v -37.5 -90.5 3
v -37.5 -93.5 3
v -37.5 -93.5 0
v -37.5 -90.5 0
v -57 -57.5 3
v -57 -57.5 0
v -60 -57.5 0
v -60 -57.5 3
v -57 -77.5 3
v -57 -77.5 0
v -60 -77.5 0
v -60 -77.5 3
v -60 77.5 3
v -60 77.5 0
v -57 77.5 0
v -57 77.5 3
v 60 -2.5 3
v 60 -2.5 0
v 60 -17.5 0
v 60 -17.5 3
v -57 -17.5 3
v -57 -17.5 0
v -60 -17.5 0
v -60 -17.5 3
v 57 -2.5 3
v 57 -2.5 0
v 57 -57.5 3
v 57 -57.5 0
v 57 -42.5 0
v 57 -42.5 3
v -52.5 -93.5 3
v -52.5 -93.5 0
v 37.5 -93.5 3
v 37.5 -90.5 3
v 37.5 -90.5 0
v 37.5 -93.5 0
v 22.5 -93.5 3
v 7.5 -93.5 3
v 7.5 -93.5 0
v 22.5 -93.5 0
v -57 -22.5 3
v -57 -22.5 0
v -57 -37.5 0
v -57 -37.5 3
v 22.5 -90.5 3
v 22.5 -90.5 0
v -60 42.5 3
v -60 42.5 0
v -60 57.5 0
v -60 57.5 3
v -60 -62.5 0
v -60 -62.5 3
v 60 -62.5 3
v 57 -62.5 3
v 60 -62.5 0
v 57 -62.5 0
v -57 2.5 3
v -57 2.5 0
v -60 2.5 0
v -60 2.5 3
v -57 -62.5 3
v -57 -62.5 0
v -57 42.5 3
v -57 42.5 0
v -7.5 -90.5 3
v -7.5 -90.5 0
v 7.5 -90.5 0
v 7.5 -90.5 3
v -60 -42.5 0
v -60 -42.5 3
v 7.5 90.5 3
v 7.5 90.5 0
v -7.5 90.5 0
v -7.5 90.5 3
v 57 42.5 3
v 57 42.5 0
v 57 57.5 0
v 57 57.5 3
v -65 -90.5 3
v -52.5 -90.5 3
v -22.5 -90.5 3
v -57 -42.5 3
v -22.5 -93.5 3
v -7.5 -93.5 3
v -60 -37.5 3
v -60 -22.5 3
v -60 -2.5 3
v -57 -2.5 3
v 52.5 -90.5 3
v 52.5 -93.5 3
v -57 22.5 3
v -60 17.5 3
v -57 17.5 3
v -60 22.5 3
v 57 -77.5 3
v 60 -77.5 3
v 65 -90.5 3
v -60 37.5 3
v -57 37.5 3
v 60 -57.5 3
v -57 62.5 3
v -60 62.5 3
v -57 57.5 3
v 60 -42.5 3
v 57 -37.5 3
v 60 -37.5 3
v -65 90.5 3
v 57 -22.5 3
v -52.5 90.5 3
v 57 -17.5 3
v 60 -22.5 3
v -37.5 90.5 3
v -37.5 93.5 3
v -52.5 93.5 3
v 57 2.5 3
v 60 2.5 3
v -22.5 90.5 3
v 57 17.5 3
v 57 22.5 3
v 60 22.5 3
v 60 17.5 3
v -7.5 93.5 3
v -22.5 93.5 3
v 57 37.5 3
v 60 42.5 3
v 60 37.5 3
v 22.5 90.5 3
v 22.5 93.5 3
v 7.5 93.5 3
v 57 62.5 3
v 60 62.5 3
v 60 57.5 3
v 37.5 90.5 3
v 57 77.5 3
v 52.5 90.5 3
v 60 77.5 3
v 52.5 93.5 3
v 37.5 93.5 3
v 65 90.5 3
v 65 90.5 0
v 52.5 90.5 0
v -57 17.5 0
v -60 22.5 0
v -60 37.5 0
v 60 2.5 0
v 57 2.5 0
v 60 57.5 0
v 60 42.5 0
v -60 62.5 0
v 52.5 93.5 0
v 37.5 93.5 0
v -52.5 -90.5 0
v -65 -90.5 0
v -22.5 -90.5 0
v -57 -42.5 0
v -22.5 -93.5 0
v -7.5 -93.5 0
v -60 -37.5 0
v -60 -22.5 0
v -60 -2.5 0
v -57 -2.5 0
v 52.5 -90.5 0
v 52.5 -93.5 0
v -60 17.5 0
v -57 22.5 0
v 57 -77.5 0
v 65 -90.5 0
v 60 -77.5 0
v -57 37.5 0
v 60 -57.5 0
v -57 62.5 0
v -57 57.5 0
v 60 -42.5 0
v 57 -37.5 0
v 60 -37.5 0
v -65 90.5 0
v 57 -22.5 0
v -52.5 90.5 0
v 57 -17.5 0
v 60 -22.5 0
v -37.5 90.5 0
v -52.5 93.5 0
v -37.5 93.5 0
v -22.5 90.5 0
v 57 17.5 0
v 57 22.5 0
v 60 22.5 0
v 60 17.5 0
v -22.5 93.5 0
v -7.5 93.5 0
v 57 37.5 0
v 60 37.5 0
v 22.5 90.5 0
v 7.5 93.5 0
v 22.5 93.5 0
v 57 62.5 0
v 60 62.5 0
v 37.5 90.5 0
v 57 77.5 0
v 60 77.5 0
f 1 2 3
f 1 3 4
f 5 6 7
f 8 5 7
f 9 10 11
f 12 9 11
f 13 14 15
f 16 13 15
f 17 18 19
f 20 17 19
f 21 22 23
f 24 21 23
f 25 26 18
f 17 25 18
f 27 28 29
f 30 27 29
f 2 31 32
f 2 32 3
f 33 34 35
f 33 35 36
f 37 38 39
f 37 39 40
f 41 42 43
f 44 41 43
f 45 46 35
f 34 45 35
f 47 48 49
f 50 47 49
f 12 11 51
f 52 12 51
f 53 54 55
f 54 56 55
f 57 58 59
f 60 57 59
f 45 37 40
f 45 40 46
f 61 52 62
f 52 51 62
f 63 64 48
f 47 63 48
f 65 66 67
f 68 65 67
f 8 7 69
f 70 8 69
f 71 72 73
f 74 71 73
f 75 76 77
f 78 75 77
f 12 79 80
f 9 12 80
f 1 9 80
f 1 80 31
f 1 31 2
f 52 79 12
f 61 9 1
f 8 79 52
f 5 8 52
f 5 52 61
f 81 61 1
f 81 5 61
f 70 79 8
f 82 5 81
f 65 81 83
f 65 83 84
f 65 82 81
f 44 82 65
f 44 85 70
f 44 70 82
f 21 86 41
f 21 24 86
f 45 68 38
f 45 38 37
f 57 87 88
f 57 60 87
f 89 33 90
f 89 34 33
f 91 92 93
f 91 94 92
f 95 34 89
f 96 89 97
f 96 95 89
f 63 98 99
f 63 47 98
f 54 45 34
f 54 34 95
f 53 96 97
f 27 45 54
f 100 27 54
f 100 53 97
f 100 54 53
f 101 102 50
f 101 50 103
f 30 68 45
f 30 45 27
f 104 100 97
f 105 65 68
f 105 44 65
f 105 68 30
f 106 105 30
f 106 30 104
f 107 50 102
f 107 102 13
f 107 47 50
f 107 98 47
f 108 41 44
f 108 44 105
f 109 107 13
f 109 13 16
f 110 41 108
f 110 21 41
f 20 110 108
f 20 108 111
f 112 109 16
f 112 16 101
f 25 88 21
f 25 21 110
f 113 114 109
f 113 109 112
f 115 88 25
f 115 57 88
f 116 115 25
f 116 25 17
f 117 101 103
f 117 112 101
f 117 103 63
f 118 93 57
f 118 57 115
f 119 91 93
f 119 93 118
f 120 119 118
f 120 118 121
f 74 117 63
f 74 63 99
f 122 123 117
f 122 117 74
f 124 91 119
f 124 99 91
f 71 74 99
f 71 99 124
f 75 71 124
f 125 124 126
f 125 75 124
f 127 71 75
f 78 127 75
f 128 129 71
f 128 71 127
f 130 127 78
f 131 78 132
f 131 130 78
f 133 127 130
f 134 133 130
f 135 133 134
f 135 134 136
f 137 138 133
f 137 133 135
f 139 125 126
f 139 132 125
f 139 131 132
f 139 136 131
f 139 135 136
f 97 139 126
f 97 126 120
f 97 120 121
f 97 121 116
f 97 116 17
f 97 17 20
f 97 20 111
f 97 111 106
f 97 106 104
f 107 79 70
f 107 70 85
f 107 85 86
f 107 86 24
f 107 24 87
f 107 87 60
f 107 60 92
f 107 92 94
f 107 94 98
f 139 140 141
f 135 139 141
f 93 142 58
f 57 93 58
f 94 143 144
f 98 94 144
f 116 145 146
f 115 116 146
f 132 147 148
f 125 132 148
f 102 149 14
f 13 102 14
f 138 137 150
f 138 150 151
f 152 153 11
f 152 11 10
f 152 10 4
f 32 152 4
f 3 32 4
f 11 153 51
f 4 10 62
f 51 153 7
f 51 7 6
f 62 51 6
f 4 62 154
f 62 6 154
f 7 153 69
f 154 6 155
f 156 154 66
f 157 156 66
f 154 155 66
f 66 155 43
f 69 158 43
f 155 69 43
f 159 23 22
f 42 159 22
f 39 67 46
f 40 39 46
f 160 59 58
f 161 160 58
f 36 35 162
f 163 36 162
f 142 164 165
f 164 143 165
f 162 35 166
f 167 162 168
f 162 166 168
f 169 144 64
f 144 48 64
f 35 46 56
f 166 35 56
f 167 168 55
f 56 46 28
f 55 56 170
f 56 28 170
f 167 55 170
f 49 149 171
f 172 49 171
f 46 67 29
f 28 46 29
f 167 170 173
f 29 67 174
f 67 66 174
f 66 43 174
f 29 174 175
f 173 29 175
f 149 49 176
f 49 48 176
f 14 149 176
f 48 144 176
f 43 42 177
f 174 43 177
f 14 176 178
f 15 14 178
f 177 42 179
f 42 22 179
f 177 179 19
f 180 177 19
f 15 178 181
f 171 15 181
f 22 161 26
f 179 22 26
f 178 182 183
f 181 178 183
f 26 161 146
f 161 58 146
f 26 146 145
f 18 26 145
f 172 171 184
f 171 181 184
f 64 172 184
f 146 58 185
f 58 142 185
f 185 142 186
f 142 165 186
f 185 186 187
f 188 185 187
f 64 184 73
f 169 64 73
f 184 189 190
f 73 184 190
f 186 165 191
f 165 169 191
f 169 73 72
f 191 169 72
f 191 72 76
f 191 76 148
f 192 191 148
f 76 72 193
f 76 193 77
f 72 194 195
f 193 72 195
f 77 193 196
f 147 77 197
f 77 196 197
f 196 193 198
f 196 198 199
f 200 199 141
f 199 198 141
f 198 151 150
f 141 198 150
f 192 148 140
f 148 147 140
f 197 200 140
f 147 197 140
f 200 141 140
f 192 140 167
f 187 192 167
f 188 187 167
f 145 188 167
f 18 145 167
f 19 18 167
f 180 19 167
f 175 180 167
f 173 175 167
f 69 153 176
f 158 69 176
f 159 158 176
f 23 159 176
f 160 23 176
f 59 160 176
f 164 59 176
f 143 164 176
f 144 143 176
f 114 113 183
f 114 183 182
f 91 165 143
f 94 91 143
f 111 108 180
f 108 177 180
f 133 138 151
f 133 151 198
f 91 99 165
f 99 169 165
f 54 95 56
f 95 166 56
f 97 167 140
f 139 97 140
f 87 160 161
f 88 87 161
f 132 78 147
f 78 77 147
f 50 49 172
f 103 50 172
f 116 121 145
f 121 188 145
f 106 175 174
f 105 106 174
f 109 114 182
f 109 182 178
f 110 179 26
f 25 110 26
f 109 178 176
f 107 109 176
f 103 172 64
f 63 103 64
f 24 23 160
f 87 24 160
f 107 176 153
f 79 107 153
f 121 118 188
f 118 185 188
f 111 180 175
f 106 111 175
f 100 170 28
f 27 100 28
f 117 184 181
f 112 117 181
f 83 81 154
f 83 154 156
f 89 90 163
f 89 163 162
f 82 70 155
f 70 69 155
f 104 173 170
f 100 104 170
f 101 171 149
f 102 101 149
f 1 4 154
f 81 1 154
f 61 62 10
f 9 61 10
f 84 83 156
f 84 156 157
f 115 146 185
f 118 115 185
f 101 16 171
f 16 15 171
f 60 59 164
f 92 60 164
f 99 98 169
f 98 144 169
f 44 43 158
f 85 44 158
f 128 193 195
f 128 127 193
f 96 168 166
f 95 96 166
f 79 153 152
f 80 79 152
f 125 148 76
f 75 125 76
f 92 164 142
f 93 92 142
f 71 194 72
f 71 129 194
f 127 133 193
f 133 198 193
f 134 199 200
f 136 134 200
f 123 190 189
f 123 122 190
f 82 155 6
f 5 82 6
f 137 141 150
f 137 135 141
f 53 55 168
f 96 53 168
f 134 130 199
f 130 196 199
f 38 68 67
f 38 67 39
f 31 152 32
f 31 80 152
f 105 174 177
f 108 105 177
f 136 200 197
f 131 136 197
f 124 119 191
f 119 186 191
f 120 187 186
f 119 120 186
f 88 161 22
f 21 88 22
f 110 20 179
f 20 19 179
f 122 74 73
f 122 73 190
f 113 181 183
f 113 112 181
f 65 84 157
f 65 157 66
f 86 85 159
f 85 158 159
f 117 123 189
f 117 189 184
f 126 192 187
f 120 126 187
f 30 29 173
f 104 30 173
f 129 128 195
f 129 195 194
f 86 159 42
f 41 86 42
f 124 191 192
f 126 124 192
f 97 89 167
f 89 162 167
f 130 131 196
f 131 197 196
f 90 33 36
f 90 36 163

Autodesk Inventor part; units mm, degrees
ref_plane "YZ Plane" through (0, 0, 0) normal (1, 0, 0) x (0, 1, 0)
ref_plane "XZ Plane" through (0, 0, 0) normal (0, 1, 0) x (-1, 0, 0)
ref_plane "XY Plane" through (0, 0, 0) normal (0, 0, 1) x (1, 0, 0)
sketch "Sketch1" plane through (0, 0, 0) normal (0, 0, 1) x (1, 0, 0)
  line L0 (-65, -90.5) -> (65, -90.5)
  line L1 (65, -90.5) -> (65, 90.5)
  line L2 (65, 90.5) -> (-65, 90.5)
  line L3 (-65, 90.5) -> (-65, -90.5)
  line L4 (-65, -90.5) -> (65, 90.5) construction
  line L5 (65, -90.5) -> (-65, 90.5) construction
  line L6 (-60, 77.5) -> (-57, 77.5)
  line L7 (-57, 77.5) -> (-57, 62.5)
  line L8 (-57, 62.5) -> (-60, 62.5)
  line L9 (-60, 62.5) -> (-60, 77.5)
  line L10 (-60, 77.5) -> (-57, 62.5) construction
  line L11 (-57, 77.5) -> (-60, 62.5) construction
  line L12 (-60, 57.5) -> (-57, 57.5)
  line L13 (-57, 57.5) -> (-57, 42.5)
  line L14 (-57, 42.5) -> (-60, 42.5)
  line L15 (-60, 42.5) -> (-60, 57.5)
  line L16 (-60, 57.5) -> (-57, 42.5) construction
  line L17 (-57, 57.5) -> (-60, 42.5) construction
  line L18 (-60, 37.5) -> (-57, 37.5)
  line L19 (-57, 37.5) -> (-57, 22.5)
  line L20 (-57, 22.5) -> (-60, 22.5)
  line L21 (-60, 22.5) -> (-60, 37.5)
  line L22 (-60, 37.5) -> (-57, 22.5) construction
  line L23 (-57, 37.5) -> (-60, 22.5) construction
  line L24 (-60, 17.5) -> (-57, 17.5)
  line L25 (-57, 17.5) -> (-57, 2.5)
  line L26 (-57, 2.5) -> (-60, 2.5)
  line L27 (-60, 2.5) -> (-60, 17.5)
  line L28 (-60, 17.5) -> (-57, 2.5) construction
  line L29 (-57, 17.5) -> (-60, 2.5) construction
  line L30 (-60, -2.5) -> (-57, -2.5)
  line L31 (-57, -2.5) -> (-57, -17.5)
  line L32 (-57, -17.5) -> (-60, -17.5)
  line L33 (-60, -17.5) -> (-60, -2.5)
  line L34 (-60, -2.5) -> (-57, -17.5) construction
  line L35 (-57, -2.5) -> (-60, -17.5) construction
  line L36 (-60, -22.5) -> (-57, -22.5)
  line L37 (-57, -22.5) -> (-57, -37.5)
  line L38 (-57, -37.5) -> (-60, -37.5)
  line L39 (-60, -37.5) -> (-60, -22.5)
  line L40 (-60, -22.5) -> (-57, -37.5) construction
  line L41 (-57, -22.5) -> (-60, -37.5) construction
  line L42 (-60, -42.5) -> (-57, -42.5)
  line L43 (-57, -42.5) -> (-57, -57.5)
  line L44 (-57, -57.5) -> (-60, -57.5)
  line L45 (-60, -57.5) -> (-60, -42.5)
  line L46 (-60, -42.5) -> (-57, -57.5) construction
  line L47 (-57, -42.5) -> (-60, -57.5) construction
  line L48 (-60, -62.5) -> (-57, -62.5)
  line L49 (-57, -62.5) -> (-57, -77.5)
  line L50 (-57, -77.5) -> (-60, -77.5)
  line L51 (-60, -77.5) -> (-60, -62.5)
  line L52 (-60, -62.5) -> (-57, -77.5) construction
  line L53 (-57, -62.5) -> (-60, -77.5) construction
  line L54 (57, 77.5) -> (60, 77.5)
  line L55 (60, 77.5) -> (60, 62.5)
  line L56 (60, 62.5) -> (57, 62.5)
  line L57 (57, 62.5) -> (57, 77.5)
  line L58 (57, 77.5) -> (60, 62.5) construction
  line L59 (60, 77.5) -> (57, 62.5) construction
  line L60 (57, 57.5) -> (60, 57.5)
  line L61 (60, 57.5) -> (60, 42.5)
  line L62 (60, 42.5) -> (57, 42.5)
  line L63 (57, 42.5) -> (57, 57.5)
  line L64 (57, 57.5) -> (60, 42.5) construction
  line L65 (60, 57.5) -> (57, 42.5) construction
  line L66 (57, 37.5) -> (60, 37.5)
  line L67 (60, 37.5) -> (60, 22.5)
  line L68 (60, 22.5) -> (57, 22.5)
  line L69 (57, 22.5) -> (57, 37.5)
  line L70 (57, 37.5) -> (60, 22.5) construction
  line L71 (60, 37.5) -> (57, 22.5) construction
  line L72 (57, 17.5) -> (60, 17.5)
  line L73 (60, 17.5) -> (60, 2.5)
  line L74 (60, 2.5) -> (57, 2.5)
  line L75 (57, 2.5) -> (57, 17.5)
  line L76 (57, 17.5) -> (60, 2.5) construction
  line L77 (60, 17.5) -> (57, 2.5) construction
  line L78 (57, -2.5) -> (60, -2.5)
  line L79 (60, -2.5) -> (60, -17.5)
  line L80 (60, -17.5) -> (57, -17.5)
  line L81 (57, -17.5) -> (57, -2.5)
  line L82 (57, -2.5) -> (60, -17.5) construction
  line L83 (60, -2.5) -> (57, -17.5) construction
  line L84 (57, -22.5) -> (60, -22.5)
  line L85 (60, -22.5) -> (60, -37.5)
  line L86 (60, -37.5) -> (57, -37.5)
  line L87 (57, -37.5) -> (57, -22.5)
  line L88 (57, -22.5) -> (60, -37.5) construction
  line L89 (60, -22.5) -> (57, -37.5) construction
  line L90 (57, -42.5) -> (60, -42.5)
  line L91 (60, -42.5) -> (60, -57.5)
  line L92 (60, -57.5) -> (57, -57.5)
  line L93 (57, -57.5) -> (57, -42.5)
  line L94 (57, -42.5) -> (60, -57.5) construction
  line L95 (60, -42.5) -> (57, -57.5) construction
  line L96 (57, -62.5) -> (60, -62.5)
  line L97 (60, -62.5) -> (60, -77.5)
  line L98 (60, -77.5) -> (57, -77.5)
  line L99 (57, -77.5) -> (57, -62.5)
  line L100 (57, -62.5) -> (60, -77.5) construction
  line L101 (60, -62.5) -> (57, -77.5) construction
  point P0 (0, 0)
  point P1 (-58.5, 70)
  point P2 (-58.5, 50)
  point P3 (-58.5, 30)
  point P4 (-58.5, 10)
  point P5 (-58.5, -10)
  point P6 (-58.5, -30)
  point P7 (-58.5, -50)
  point P8 (-58.5, -70)
  point P9 (58.5, 70)
  point P10 (58.5, 50)
  point P11 (58.5, 30)
  point P12 (58.5, 10)
  point P13 (58.5, -10)
  point P14 (58.5, -30)
  point P15 (58.5, -50)
  point P16 (58.5, -70)
  dimension "d0" = 130
  dimension "d1" = 181
  dimension "d2" = 3
  dimension "d3" = 15
  dimension "d8" = 5
  dimension "d9" = 13
  dimension "d12" = 20
  dimension "d15" = 117
extrude "Extrusion1" add sketch "Sketch1" along normal blind 3
sketch "Sketch2" plane through (0, 0, 3) normal (0, 0, 1) x (1, 0, 0)
  line L0 (65, 90.5) -> (-65, 90.5) projected
  line L1 (-52.5, 90.5) -> (-37.5, 90.5)
  line L2 (-37.5, 90.5) -> (-37.5, 93.5)
  line L3 (-37.5, 93.5) -> (-52.5, 93.5)
  line L4 (-52.5, 93.5) -> (-52.5, 90.5)
  line L5 (-22.5, 90.5) -> (-7.5, 90.5)
  line L6 (-7.5, 90.5) -> (-7.5, 93.5)
  line L7 (-7.5, 93.5) -> (-22.5, 93.5)
  line L8 (-22.5, 93.5) -> (-22.5, 90.5)
  line L9 (7.5, 90.5) -> (22.5, 90.5)
  line L10 (22.5, 90.5) -> (22.5, 93.5)
  line L11 (22.5, 93.5) -> (7.5, 93.5)
  line L12 (7.5, 93.5) -> (7.5, 90.5)
  line L13 (37.5, 90.5) -> (52.5, 90.5)
  line L14 (52.5, 90.5) -> (52.5, 93.5)
  line L15 (52.5, 93.5) -> (37.5, 93.5)
  line L16 (37.5, 93.5) -> (37.5, 90.5)
  line L17 (-52.5, -93.5) -> (-37.5, -93.5)
  line L18 (-37.5, -93.5) -> (-37.5, -90.5)
  line L19 (-37.5, -90.5) -> (-52.5, -90.5)
  line L20 (-52.5, -90.5) -> (-52.5, -93.5)
  line L21 (-22.5, -93.5) -> (-7.5, -93.5)
  line L22 (-7.5, -93.5) -> (-7.5, -90.5)
  line L23 (-7.5, -90.5) -> (-22.5, -90.5)
  line L24 (-22.5, -90.5) -> (-22.5, -93.5)
  line L25 (7.5, -93.5) -> (22.5, -93.5)
  line L26 (22.5, -93.5) -> (22.5, -90.5)
  line L27 (22.5, -90.5) -> (7.5, -90.5)
  line L28 (7.5, -90.5) -> (7.5, -93.5)
  line L29 (37.5, -93.5) -> (52.5, -93.5)
  line L30 (52.5, -93.5) -> (52.5, -90.5)
  line L31 (52.5, -90.5) -> (37.5, -90.5)
  line L32 (37.5, -90.5) -> (37.5, -93.5)
  line L33 (-65, 90.5) -> (-65, -90.5) projected
  point P0 (0, 0)
  dimension "d20" = 15
  dimension "d21" = 3
  dimension "d24" = 30
  dimension "d27" = 184
  dimension "d30" = 12.5
extrude "Extrusion2" add sketch "Sketch2" against normal blind 3
equation "\"BendRadius\" = Thickness"
equation "\"BendReliefWidth\" = Thickness"
equation "\"BendReliefDepth\" = 0.5 * Thickness"
equation "\"CornerReliefSize\" = 4 * Thickness"
equation "\"MinimumRemnant\" = 2 * Thickness"
equation "\"TransitionRadius\" = BendRadius"
equation "\"JacobiRadiusSize\" = BendRadius"
equation "\"GapSize\" = Thickness"
equation "\"Thickness\" = 0.5"
properties part number "1 binnen achterplaat"
